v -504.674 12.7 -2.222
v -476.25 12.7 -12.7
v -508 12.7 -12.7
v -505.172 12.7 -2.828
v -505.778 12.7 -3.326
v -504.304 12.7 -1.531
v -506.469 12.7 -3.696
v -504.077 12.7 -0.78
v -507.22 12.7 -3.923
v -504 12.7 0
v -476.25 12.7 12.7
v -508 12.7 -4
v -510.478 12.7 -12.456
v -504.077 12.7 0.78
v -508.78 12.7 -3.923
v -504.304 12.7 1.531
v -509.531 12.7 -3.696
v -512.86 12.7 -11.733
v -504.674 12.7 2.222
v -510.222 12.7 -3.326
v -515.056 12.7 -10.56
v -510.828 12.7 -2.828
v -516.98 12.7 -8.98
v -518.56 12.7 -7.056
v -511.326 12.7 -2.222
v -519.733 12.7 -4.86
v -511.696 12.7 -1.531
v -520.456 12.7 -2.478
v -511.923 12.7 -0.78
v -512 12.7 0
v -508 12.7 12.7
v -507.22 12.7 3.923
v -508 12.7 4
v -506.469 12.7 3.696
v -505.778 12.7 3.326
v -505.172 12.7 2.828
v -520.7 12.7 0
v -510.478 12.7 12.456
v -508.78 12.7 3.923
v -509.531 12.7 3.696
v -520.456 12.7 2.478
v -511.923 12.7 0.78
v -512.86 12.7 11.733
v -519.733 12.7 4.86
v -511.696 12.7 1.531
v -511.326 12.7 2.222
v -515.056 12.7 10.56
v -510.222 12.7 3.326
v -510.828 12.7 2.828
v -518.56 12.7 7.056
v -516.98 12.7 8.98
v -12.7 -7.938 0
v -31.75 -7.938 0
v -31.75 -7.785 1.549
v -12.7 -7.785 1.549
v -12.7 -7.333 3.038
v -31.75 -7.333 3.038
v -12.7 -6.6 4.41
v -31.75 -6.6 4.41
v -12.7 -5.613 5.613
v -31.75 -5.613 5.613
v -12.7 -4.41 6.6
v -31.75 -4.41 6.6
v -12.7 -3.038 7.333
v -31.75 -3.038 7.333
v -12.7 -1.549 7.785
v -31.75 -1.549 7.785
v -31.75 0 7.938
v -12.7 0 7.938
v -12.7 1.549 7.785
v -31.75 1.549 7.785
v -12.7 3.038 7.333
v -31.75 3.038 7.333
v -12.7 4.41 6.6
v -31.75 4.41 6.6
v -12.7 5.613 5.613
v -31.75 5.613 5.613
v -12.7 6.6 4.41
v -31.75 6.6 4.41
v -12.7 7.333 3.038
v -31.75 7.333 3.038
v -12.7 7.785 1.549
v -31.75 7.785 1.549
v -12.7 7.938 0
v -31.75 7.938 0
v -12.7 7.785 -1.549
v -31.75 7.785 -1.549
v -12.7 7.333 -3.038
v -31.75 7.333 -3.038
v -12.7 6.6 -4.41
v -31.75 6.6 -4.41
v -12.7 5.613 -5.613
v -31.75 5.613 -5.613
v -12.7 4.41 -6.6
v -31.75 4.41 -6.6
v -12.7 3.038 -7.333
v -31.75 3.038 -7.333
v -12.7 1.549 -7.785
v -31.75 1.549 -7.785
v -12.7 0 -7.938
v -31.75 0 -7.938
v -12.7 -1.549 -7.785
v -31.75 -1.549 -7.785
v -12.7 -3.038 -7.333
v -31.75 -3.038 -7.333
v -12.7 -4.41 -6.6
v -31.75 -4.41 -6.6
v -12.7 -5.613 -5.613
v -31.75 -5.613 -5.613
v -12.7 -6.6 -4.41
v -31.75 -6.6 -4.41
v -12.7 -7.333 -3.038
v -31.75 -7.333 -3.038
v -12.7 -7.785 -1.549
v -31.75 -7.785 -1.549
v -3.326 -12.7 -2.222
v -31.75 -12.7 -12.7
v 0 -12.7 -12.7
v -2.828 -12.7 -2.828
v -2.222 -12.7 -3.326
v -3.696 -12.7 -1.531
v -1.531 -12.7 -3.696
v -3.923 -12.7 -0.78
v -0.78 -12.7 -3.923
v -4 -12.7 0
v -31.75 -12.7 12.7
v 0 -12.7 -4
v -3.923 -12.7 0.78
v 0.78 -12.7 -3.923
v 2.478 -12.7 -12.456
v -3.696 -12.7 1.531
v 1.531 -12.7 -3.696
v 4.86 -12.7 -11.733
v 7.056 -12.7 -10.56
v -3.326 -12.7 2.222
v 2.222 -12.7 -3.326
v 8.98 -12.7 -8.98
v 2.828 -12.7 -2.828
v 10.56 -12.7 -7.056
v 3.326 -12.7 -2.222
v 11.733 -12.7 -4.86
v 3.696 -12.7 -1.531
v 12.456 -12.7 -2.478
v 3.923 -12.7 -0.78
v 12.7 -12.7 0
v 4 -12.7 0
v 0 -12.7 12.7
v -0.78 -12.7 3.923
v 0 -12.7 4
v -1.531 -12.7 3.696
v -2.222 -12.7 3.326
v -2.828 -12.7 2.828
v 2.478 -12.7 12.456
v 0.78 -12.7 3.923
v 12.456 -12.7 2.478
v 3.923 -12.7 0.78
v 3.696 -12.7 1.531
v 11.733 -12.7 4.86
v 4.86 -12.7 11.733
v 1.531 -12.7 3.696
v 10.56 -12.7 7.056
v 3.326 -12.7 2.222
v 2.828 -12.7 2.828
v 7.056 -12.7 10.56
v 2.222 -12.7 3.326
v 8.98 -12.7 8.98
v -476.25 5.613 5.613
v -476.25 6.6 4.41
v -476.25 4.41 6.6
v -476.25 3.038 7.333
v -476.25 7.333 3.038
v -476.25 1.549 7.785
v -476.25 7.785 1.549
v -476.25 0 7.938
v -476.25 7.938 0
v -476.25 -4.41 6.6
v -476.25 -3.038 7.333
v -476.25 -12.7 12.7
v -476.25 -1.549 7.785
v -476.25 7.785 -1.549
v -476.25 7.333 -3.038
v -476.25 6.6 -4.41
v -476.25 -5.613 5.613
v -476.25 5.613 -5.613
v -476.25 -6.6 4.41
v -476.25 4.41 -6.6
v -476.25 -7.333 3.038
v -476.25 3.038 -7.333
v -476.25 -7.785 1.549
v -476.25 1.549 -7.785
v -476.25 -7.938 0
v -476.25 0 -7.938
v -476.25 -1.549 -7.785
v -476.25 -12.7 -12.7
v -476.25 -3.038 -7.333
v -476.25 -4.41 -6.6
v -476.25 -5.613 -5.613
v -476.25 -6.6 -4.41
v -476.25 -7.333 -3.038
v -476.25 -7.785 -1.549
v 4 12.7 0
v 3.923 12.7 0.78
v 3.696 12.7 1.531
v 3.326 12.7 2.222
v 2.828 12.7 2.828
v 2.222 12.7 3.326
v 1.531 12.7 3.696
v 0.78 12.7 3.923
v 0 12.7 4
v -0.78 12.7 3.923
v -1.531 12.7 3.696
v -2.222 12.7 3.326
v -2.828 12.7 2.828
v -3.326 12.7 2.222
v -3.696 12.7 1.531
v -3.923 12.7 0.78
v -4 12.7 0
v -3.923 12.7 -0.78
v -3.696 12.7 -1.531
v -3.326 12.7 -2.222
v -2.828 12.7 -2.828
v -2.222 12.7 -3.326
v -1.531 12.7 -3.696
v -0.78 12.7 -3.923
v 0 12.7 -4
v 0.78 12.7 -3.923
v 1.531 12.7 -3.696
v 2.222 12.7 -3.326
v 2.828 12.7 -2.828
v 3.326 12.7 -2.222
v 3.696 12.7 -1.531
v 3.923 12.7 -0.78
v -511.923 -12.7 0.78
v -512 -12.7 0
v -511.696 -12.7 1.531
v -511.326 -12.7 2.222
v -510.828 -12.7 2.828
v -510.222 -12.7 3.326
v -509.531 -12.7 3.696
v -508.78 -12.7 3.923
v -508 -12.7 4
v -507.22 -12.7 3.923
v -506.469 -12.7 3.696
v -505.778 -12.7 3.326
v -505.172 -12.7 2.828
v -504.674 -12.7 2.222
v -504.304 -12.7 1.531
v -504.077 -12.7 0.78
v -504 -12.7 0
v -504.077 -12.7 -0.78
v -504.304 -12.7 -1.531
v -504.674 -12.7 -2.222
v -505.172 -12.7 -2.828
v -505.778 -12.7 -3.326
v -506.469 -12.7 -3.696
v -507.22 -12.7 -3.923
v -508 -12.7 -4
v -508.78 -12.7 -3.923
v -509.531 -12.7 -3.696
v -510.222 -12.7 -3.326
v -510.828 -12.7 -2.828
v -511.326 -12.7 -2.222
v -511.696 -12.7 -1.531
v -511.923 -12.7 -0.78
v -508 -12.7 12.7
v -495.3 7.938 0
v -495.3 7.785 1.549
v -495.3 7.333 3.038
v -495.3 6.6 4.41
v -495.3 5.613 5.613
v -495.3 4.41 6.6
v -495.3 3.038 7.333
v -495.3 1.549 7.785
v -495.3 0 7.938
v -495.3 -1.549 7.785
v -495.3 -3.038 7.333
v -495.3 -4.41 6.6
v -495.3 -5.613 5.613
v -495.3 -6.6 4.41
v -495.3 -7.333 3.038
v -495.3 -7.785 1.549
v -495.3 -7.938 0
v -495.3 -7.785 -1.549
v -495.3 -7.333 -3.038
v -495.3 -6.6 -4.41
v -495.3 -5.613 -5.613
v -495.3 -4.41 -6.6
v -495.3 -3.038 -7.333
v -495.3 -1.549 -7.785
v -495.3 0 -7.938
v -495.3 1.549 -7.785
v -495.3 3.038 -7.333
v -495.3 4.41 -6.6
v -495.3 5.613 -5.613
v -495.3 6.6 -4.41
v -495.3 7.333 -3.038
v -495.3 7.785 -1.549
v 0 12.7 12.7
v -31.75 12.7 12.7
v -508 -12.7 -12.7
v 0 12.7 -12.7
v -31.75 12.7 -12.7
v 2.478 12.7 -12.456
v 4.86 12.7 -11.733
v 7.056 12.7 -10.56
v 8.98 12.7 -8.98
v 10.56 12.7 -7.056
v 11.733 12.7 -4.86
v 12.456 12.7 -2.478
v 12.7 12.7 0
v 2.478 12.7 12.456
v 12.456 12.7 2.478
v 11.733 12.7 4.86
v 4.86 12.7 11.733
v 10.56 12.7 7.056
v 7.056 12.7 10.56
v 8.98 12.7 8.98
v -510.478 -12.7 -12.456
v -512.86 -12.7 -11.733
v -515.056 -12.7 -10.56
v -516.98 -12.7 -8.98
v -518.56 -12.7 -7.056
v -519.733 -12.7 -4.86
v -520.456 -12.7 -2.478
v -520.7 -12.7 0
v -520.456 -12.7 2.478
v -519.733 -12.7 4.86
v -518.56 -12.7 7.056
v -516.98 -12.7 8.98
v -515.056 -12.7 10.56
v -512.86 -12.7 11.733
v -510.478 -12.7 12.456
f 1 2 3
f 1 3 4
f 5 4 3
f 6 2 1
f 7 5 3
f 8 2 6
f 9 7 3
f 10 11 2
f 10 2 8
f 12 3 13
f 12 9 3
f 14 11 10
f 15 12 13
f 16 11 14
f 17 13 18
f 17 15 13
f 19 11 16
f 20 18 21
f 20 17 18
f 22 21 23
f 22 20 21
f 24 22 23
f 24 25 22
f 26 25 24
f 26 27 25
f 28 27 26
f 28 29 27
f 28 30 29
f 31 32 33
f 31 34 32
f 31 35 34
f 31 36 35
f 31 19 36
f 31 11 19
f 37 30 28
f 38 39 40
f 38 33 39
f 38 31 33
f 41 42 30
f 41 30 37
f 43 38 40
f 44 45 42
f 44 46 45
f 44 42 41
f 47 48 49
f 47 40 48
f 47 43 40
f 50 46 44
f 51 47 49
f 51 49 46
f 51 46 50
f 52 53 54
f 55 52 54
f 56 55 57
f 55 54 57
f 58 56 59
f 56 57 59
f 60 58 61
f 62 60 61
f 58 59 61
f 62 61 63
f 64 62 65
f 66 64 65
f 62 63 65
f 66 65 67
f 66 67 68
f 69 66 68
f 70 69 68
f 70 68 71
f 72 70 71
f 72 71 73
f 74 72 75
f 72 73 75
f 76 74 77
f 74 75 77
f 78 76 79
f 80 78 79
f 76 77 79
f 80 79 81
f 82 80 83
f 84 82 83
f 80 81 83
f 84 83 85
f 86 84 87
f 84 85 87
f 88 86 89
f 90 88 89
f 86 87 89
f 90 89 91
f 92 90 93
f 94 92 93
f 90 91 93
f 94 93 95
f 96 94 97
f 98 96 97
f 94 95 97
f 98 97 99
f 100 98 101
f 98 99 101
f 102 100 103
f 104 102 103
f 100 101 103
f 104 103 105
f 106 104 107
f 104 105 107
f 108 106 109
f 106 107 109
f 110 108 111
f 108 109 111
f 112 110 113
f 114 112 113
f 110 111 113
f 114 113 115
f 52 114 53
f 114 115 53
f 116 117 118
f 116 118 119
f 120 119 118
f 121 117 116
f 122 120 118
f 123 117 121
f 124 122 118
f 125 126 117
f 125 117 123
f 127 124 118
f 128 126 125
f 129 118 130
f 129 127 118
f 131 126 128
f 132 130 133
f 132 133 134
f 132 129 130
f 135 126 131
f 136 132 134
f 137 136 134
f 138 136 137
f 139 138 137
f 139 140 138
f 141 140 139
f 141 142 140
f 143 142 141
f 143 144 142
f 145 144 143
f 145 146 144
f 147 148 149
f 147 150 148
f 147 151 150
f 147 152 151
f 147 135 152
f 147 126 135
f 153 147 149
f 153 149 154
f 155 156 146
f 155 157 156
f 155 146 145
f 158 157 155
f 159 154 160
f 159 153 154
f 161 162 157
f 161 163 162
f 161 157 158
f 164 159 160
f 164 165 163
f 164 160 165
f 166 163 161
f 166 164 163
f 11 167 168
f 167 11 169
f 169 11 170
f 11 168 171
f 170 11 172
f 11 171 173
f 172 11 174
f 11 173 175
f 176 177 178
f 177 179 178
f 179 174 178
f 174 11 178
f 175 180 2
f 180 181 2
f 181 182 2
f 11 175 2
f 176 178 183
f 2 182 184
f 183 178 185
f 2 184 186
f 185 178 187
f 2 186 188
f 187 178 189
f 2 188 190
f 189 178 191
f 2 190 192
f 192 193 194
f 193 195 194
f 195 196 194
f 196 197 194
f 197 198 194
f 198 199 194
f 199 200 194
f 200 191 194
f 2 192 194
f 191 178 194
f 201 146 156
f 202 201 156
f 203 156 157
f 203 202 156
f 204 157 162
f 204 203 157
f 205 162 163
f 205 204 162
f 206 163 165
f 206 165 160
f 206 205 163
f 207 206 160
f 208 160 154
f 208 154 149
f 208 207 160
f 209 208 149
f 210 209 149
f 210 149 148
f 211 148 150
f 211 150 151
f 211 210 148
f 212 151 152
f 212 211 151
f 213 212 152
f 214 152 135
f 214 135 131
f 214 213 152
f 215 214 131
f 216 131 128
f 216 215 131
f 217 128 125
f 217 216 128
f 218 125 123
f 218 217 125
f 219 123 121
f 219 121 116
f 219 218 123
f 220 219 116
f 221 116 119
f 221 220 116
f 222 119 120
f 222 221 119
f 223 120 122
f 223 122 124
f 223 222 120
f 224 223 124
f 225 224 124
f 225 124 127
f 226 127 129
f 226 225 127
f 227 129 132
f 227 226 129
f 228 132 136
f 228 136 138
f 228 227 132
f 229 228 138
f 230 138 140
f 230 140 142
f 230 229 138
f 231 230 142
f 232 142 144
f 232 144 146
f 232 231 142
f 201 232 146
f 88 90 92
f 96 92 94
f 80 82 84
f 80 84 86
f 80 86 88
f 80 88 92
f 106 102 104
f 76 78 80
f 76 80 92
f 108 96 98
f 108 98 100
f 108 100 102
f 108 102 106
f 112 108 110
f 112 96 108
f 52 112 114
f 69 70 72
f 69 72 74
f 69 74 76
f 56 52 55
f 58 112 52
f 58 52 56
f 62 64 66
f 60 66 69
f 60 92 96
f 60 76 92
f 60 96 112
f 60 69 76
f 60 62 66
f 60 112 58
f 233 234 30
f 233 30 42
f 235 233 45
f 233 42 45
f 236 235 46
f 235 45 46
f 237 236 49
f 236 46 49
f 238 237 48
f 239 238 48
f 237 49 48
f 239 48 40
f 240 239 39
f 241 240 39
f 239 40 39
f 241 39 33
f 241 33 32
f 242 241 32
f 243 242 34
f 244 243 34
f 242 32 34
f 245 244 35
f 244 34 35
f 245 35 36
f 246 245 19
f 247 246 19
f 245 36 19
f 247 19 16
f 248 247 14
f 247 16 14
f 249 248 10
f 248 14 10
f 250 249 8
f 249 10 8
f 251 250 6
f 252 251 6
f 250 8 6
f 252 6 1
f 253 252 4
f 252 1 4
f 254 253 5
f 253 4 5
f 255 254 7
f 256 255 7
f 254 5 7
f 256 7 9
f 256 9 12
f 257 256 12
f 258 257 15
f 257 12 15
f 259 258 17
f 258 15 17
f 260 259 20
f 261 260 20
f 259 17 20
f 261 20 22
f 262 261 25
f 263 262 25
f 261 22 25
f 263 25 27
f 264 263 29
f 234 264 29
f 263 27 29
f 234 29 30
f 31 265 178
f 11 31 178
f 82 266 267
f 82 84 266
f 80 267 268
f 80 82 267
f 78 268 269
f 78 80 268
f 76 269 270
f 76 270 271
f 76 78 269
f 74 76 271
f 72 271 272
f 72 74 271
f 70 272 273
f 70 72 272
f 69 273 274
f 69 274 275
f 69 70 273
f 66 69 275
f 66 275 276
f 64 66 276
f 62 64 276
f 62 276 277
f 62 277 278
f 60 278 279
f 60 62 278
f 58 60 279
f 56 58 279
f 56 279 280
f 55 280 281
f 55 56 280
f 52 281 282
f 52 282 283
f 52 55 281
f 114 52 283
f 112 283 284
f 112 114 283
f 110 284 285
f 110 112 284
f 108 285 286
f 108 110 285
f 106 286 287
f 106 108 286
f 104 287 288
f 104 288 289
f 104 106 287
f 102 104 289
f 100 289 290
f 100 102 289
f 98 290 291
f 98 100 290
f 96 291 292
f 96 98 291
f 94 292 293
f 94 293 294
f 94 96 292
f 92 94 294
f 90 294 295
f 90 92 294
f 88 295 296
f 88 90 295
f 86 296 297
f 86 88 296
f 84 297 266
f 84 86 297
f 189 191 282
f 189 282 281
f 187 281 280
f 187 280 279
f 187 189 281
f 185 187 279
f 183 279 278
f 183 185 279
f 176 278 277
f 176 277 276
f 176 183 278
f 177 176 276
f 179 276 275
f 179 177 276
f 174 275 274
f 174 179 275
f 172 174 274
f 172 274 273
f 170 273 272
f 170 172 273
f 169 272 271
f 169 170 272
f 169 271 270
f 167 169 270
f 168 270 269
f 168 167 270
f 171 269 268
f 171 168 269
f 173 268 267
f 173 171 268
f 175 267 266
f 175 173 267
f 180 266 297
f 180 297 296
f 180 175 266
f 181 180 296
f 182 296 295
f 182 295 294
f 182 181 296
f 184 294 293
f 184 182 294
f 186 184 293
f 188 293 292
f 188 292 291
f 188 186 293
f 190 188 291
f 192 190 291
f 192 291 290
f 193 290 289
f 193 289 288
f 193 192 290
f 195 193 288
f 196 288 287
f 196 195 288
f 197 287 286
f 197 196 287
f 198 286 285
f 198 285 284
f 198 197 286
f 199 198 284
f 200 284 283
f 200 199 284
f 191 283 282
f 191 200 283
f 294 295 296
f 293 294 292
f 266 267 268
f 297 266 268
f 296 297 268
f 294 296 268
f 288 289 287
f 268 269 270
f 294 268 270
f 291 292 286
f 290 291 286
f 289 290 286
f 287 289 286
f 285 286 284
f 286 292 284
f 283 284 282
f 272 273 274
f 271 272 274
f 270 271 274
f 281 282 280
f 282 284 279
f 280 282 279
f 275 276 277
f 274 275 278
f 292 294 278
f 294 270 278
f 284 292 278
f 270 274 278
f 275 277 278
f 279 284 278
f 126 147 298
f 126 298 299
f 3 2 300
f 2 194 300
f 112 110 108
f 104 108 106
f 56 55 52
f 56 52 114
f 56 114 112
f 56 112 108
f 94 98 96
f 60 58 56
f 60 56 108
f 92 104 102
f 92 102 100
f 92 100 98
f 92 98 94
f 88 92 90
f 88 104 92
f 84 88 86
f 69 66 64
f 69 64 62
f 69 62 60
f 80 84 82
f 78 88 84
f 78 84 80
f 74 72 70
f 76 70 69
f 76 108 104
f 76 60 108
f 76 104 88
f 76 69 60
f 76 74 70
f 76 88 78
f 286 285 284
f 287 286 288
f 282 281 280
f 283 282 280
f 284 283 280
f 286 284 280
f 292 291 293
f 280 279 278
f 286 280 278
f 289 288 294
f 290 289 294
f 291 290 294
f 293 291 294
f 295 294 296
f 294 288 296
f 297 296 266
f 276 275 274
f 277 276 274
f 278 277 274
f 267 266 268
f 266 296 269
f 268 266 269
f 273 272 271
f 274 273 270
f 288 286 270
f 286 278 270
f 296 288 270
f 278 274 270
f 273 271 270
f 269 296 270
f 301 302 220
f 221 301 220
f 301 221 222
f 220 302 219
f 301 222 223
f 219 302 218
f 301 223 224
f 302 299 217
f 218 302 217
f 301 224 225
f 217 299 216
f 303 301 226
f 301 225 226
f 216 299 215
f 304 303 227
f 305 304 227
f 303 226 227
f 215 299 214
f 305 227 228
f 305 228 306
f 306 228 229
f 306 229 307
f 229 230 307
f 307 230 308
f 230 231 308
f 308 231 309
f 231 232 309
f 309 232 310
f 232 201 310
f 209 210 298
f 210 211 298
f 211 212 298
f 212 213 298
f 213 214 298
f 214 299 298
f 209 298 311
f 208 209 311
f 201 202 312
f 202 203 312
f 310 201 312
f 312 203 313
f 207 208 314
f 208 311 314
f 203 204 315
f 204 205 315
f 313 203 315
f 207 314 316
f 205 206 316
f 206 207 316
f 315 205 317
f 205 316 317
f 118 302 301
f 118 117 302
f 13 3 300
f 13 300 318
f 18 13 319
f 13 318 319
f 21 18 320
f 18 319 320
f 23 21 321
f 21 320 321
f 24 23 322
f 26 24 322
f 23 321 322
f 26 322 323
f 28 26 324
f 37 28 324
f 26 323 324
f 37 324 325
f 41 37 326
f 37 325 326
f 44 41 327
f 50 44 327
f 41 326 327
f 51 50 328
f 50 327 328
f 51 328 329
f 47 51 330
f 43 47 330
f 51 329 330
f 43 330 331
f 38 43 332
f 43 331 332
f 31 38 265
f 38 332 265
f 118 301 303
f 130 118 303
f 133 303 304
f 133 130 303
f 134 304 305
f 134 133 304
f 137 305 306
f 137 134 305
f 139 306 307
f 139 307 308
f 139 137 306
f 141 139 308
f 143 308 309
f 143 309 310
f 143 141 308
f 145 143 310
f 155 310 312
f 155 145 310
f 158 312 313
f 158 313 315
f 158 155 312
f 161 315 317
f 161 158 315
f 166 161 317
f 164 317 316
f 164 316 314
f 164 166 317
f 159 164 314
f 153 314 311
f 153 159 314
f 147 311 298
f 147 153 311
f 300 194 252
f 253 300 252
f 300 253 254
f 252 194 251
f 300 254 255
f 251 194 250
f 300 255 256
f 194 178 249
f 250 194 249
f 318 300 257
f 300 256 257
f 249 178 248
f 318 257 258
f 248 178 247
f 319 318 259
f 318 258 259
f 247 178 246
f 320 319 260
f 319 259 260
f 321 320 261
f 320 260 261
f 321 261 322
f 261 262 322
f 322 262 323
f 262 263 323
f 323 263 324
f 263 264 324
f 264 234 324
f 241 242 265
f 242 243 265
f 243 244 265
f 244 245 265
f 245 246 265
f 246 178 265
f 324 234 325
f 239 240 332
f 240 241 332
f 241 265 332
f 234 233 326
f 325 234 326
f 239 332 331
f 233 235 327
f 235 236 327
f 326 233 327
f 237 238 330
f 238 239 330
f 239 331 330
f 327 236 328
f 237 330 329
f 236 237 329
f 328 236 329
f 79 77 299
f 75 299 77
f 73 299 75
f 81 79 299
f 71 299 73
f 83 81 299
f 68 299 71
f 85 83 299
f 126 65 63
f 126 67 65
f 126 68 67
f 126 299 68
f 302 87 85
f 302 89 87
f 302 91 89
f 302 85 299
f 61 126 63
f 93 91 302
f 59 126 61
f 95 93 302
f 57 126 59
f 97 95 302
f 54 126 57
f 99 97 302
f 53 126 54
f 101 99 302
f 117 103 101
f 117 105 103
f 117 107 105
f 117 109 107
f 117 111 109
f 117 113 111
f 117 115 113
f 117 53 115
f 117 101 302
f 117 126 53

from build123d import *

# Parameters (mm, degrees)
F0_R          = 4
F1_DEPTH      = 12.7
F2_R          = 7.9375
F3_DEPTH      = 19.05
F6_R          = 7.9375
F7_DEPTH      = 241.3
F7_DEPTH_BACK = 241.3


with BuildPart() as f1:
    # F0 (on Front) → F1 (new body, symmetric)
    with BuildSketch(Plane.XZ):
        with BuildLine():
            ThreePointArc((0, -12.7), (12.7, 0), (0, 12.7))
            Line((0, 12.7), (-31.75, 12.7))
            Line((-31.75, 12.7), (-31.75, -12.7))
            Line((-31.75, -12.7), (0, -12.7))
        make_face()
        Circle(F0_R, mode=Mode.SUBTRACT)
    extrude(amount=F1_DEPTH, both=True)

    # F2 (on face) → F3 (cut)
    with BuildSketch(Plane(origin=(-31.75, 0, 0), x_dir=(0, -1, 0), z_dir=(-1, 0, 0))):
        Circle(F2_R)
    extrude(amount=-F3_DEPTH, mode=Mode.SUBTRACT)


with BuildPart() as f5_1:
    # F5: instance of F1
    add(f1.part.mirror(Plane.YZ.offset(-254)))


with BuildPart() as f7:
    # F6 (on offset) → F7 (new body, two sides)
    with BuildSketch(Plane.YZ.offset(-254)) as f7_sk:
        Circle(F6_R)
    extrude(amount=F7_DEPTH)
    extrude(f7_sk.sketch, amount=-F7_DEPTH_BACK)


solid = Compound([f1.part, f5_1.part, f7.part])
